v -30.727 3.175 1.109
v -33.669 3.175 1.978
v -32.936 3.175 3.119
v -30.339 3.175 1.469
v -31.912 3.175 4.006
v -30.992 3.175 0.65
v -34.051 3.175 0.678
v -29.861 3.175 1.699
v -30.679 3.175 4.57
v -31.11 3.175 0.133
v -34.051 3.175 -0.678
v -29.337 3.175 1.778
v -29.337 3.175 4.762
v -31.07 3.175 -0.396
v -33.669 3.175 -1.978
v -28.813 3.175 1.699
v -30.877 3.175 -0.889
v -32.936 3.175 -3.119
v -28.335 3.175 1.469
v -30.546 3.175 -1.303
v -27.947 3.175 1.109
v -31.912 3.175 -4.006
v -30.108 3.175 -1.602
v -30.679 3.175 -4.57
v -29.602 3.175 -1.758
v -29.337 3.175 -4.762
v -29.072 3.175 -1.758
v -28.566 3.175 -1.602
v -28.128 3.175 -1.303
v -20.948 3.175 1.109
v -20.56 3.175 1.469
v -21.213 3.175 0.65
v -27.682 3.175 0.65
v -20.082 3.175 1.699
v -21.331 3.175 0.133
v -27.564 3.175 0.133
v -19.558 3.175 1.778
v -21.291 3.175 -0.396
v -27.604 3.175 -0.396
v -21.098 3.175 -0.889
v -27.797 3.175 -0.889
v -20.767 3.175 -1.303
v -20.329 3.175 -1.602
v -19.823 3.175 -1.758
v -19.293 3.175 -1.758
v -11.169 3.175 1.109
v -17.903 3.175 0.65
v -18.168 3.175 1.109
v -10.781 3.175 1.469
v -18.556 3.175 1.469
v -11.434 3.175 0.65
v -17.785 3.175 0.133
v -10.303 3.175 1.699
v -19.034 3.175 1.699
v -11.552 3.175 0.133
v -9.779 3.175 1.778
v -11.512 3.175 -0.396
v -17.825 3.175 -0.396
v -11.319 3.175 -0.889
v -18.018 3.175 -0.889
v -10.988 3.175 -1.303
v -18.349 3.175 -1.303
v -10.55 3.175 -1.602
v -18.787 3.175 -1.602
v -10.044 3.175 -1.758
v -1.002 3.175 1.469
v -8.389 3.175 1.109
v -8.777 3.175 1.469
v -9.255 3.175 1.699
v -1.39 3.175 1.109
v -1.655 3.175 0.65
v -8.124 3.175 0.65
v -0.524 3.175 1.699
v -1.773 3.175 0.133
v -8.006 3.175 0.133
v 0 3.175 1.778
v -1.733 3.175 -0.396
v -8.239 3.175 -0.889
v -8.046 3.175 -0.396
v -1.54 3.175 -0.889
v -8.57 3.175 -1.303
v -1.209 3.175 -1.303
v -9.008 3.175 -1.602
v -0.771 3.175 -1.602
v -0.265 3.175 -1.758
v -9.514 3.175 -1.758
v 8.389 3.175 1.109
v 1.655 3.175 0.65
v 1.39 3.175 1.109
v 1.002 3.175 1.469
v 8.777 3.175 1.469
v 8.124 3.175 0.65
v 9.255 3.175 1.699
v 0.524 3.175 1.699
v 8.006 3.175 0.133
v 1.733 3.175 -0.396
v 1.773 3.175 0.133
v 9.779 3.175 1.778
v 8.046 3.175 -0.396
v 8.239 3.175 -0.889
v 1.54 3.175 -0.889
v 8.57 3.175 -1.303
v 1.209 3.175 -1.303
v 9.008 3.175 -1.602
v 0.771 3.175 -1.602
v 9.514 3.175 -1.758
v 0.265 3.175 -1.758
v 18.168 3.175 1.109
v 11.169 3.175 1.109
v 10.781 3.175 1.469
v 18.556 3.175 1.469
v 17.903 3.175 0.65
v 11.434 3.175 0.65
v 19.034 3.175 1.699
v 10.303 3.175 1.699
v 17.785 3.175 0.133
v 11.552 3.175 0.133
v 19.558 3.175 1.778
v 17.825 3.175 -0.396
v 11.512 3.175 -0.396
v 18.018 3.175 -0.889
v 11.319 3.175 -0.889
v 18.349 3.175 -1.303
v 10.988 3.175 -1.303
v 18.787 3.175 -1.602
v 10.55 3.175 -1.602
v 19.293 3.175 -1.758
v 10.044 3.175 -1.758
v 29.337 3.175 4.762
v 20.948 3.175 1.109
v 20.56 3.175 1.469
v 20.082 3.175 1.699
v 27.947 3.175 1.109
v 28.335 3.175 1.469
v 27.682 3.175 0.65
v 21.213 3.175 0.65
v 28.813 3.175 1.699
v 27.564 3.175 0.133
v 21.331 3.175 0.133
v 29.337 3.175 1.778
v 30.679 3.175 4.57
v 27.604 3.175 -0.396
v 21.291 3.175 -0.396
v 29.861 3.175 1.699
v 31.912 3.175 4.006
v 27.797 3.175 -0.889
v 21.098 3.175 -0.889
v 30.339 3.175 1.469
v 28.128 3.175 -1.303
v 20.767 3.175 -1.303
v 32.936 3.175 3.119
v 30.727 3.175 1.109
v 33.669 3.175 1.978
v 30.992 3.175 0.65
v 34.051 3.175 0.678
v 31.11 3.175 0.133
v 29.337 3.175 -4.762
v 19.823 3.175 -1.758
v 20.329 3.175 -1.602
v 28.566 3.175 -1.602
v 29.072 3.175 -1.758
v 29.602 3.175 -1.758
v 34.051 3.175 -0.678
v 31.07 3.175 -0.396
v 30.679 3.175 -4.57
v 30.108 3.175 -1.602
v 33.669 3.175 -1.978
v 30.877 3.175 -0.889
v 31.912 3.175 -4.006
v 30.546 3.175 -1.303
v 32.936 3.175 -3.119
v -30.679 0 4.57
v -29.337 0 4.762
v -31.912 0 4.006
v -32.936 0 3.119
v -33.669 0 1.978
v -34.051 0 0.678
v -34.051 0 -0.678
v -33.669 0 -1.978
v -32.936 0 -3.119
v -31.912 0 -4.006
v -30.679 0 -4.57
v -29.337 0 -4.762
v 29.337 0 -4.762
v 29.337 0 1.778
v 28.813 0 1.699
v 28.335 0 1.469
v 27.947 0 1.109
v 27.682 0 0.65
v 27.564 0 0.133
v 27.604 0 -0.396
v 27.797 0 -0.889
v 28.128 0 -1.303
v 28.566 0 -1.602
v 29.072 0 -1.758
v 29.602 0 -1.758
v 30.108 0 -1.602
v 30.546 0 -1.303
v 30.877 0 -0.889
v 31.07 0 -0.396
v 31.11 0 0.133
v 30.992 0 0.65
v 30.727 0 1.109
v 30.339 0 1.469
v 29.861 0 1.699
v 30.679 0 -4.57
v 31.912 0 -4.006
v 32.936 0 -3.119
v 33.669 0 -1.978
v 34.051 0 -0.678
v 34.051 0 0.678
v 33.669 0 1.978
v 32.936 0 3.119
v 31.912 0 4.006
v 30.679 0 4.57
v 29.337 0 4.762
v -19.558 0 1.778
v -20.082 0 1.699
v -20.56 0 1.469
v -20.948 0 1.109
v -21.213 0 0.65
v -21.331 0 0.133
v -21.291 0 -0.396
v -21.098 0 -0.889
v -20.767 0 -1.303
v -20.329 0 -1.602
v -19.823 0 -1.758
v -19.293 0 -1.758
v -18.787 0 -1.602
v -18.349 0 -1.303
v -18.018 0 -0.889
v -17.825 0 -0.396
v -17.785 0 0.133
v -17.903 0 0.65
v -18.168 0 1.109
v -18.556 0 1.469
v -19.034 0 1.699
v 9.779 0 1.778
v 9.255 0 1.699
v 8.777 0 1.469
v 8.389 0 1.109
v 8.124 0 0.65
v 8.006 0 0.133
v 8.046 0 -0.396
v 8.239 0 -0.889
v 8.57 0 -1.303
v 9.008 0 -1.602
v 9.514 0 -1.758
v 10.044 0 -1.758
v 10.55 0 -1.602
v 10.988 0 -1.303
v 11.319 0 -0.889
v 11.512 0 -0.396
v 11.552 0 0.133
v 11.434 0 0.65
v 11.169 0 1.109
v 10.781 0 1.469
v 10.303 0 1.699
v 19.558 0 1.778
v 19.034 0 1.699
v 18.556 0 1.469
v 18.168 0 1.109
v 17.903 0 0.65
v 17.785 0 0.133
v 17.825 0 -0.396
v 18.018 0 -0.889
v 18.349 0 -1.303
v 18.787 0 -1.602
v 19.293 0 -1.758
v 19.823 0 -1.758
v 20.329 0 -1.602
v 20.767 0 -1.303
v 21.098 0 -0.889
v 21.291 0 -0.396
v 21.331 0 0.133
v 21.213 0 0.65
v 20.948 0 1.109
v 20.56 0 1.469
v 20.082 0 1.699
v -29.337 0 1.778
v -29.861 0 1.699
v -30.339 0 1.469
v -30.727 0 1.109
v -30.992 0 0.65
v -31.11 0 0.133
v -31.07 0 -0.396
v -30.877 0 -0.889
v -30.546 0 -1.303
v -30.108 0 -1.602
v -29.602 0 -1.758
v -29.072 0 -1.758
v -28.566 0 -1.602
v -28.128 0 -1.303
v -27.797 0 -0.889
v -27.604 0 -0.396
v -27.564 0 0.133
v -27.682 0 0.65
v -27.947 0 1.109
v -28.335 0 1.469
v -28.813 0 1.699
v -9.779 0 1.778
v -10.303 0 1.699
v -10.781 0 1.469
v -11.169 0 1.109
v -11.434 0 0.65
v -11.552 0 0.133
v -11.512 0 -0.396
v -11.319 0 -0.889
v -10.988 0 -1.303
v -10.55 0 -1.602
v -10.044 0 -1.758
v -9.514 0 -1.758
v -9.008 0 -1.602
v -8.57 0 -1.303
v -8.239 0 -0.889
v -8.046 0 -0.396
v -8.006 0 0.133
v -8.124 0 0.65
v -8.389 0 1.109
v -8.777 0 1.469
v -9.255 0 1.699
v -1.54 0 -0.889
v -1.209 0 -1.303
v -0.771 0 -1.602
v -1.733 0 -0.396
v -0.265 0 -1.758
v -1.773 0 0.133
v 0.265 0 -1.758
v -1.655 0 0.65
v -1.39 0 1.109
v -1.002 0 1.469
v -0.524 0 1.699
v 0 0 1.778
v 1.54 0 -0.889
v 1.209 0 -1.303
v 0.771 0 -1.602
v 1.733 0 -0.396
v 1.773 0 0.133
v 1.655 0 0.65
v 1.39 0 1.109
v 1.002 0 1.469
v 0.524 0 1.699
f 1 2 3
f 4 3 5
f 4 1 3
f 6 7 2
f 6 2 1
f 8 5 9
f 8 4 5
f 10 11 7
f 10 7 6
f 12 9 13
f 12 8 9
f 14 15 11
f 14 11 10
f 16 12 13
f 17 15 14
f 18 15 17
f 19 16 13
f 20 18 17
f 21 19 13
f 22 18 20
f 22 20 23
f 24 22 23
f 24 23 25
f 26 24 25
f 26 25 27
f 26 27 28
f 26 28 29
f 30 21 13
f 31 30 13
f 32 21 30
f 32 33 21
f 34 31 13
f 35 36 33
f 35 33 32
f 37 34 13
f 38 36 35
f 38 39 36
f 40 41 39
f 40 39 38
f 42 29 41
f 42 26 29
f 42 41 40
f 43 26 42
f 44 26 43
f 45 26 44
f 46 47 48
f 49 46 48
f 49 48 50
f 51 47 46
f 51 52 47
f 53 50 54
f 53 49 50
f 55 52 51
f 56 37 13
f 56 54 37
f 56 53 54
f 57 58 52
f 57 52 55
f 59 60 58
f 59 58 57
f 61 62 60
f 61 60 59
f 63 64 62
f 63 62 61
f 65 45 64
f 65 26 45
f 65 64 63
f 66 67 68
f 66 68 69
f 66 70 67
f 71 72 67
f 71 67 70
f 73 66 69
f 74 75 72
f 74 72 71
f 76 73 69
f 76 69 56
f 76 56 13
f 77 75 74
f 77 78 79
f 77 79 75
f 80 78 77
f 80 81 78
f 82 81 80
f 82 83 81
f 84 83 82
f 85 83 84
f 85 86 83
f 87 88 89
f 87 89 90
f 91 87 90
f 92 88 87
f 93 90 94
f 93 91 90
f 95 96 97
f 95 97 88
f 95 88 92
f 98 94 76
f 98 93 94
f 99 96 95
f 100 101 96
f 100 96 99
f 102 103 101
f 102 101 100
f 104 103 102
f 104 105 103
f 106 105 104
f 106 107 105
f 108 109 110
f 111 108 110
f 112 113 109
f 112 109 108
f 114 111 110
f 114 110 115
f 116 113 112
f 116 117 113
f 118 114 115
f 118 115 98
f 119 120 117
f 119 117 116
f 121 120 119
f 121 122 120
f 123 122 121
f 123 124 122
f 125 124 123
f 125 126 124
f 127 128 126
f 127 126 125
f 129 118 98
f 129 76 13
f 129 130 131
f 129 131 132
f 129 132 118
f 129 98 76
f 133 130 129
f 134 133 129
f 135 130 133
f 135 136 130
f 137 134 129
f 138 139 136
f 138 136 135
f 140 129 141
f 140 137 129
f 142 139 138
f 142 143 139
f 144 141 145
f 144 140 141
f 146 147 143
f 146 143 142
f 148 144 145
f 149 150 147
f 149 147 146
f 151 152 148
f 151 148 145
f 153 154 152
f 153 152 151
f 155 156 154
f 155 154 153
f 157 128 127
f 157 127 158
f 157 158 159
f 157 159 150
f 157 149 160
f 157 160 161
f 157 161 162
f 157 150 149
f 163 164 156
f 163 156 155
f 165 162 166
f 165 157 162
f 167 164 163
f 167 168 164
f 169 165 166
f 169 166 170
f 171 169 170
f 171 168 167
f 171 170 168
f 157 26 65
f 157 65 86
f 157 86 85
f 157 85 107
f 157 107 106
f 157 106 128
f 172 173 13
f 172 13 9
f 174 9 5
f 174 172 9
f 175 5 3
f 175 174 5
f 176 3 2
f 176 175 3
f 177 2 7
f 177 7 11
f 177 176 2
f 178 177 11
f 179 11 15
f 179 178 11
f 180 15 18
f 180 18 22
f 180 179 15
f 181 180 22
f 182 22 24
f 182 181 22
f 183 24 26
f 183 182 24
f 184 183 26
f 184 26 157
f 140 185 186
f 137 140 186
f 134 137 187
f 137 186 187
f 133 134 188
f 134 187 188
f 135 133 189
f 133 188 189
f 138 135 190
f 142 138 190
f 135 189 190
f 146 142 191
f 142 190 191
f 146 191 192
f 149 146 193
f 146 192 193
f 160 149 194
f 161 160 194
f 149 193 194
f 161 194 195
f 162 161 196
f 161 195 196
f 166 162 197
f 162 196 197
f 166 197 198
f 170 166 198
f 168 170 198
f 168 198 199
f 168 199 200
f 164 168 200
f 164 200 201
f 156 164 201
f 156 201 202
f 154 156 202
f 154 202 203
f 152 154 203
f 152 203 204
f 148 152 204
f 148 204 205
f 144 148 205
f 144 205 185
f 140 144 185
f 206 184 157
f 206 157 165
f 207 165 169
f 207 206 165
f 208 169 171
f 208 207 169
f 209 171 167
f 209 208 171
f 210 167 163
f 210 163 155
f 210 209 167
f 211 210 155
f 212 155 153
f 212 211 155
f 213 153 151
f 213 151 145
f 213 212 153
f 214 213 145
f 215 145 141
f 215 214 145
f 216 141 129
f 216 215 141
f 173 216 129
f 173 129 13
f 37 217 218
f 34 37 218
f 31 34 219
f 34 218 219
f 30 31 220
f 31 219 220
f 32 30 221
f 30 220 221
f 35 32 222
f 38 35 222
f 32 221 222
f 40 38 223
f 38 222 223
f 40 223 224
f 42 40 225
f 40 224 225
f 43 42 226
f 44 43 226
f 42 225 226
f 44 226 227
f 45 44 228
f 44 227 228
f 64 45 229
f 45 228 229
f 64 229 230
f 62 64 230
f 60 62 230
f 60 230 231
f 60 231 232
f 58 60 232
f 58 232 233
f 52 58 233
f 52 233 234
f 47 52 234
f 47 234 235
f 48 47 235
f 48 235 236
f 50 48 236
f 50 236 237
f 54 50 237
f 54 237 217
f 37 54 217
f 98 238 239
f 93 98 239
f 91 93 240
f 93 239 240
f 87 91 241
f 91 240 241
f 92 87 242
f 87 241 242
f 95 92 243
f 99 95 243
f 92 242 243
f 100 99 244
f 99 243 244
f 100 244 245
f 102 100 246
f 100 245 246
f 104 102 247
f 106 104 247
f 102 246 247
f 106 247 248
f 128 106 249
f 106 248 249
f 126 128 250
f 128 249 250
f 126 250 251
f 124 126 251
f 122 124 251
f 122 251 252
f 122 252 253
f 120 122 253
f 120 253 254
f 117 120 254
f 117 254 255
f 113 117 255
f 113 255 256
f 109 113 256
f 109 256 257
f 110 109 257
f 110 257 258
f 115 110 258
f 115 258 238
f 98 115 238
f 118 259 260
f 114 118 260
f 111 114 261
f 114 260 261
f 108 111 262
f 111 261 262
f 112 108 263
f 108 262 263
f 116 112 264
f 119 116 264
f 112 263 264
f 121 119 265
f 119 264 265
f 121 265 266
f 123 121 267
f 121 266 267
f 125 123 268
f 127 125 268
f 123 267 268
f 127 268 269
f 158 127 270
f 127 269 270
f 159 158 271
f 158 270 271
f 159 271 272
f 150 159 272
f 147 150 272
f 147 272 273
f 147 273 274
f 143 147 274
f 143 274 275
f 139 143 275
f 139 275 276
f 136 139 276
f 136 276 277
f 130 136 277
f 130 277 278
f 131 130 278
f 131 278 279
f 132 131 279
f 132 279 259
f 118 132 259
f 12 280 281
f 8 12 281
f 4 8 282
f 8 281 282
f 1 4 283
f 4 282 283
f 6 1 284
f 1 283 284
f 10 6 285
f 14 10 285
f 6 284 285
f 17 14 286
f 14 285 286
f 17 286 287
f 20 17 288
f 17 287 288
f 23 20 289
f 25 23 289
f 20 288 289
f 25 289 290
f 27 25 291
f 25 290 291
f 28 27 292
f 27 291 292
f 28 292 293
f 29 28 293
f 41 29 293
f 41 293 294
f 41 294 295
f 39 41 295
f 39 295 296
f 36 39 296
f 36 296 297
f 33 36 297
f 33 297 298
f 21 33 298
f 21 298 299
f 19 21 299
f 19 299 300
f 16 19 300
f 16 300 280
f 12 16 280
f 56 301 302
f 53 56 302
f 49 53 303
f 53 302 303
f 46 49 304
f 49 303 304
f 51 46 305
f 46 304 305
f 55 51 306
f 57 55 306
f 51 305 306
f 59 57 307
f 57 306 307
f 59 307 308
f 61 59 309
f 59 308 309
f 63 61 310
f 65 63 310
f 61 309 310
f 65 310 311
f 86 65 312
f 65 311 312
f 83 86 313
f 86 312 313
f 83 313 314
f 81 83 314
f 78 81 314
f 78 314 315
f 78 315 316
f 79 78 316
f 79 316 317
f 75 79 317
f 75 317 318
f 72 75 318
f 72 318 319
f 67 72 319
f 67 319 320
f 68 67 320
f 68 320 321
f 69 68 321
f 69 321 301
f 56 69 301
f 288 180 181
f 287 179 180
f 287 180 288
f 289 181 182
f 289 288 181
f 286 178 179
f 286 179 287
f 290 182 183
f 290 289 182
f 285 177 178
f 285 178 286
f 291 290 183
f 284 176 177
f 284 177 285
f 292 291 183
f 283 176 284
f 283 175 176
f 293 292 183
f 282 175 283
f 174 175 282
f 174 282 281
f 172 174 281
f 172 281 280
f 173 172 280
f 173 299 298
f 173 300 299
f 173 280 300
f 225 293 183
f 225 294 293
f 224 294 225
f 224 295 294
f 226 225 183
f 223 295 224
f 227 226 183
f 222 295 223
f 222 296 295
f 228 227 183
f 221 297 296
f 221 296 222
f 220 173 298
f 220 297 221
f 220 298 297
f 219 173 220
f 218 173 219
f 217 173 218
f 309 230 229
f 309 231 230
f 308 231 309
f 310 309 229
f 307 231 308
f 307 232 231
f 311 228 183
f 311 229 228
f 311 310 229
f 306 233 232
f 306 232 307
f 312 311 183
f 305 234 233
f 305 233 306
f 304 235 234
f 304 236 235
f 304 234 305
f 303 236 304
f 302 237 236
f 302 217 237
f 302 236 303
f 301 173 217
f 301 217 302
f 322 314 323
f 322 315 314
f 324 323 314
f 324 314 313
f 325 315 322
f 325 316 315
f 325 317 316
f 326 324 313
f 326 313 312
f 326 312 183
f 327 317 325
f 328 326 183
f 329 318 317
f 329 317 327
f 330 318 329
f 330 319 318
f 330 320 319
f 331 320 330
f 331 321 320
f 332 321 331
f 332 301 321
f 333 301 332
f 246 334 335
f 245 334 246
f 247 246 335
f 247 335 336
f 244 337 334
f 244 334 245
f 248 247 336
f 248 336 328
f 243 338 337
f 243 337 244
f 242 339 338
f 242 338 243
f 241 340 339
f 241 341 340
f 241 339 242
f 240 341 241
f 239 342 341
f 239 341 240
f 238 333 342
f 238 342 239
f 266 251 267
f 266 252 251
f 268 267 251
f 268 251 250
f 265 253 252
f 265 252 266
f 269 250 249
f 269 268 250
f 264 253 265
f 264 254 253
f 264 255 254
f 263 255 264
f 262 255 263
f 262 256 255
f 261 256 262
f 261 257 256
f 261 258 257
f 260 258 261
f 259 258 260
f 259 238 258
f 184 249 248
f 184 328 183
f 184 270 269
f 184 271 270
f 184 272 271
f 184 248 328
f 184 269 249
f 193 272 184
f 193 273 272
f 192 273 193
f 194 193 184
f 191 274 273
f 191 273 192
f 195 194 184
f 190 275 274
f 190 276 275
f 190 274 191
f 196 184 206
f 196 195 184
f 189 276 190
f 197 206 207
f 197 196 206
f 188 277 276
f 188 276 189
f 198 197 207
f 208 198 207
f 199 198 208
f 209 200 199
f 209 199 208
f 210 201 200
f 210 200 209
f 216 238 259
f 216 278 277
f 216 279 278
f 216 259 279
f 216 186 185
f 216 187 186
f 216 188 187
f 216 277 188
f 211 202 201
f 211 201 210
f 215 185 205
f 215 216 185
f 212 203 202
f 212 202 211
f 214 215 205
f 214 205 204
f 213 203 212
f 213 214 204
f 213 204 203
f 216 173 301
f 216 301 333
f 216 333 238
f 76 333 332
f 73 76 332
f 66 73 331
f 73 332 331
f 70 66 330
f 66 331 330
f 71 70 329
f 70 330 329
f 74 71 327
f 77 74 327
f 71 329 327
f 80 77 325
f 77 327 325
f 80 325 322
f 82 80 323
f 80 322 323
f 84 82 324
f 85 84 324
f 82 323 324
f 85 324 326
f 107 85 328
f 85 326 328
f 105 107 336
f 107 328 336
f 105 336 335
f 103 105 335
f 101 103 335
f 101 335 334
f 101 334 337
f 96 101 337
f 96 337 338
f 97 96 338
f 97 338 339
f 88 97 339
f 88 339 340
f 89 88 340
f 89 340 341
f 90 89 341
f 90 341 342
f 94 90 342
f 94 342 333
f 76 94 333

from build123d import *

# Parameters (mm, degrees)
SKETCH1_R           = 1.778
BOSS_EXTRUDE1_DEPTH = 6.35
SKETCH2_W           = 91.819515258
SKETCH2_H           = 20.708231101
CUT_EXTRUDE1_DEPTH  = 3.175


with BuildPart() as part:
    # Sketch1 → Boss-Extrude1 (new body)
    with BuildSketch(Plane.XZ):
        with BuildLine():
            Line((-29.337, -4.7625), (29.337, -4.7625))
            ThreePointArc((29.337, -4.7625), (34.0995, 0), (29.337, 4.7625))
            Line((29.337, 4.7625), (-29.337, 4.7625))
            ThreePointArc((-29.337, 4.7625), (-34.0995, 0), (-29.337, -4.7625))
        make_face()
        with Locations(Location((29.337, 0, 0), (0, 0, 90))):
            Circle(SKETCH1_R, mode=Mode.SUBTRACT)
        with Locations(Location((19.558, 0, 0), (0, 0, 90))):
            Circle(SKETCH1_R, mode=Mode.SUBTRACT)
        with Locations(Location((9.779, 0, 0), (0, 0, 90))):
            Circle(SKETCH1_R, mode=Mode.SUBTRACT)
        with Locations(Location((0, 0, 0), (0, 0, 90))):
            Circle(SKETCH1_R, mode=Mode.SUBTRACT)
        with Locations(Location((-9.779, 0, 0), (0, 0, 90))):
            Circle(SKETCH1_R, mode=Mode.SUBTRACT)
        with Locations(Location((-19.558, 0, 0), (0, 0, 90))):
            Circle(SKETCH1_R, mode=Mode.SUBTRACT)
        with Locations(Location((-29.337, 0, 0), (0, 0, 90))):
            Circle(SKETCH1_R, mode=Mode.SUBTRACT)
    extrude(amount=-BOSS_EXTRUDE1_DEPTH)

    # Sketch2 → Cut-Extrude1 (cut)
    with BuildSketch(Plane(origin=(0, 6.35, 0), x_dir=(1, 0, 0), z_dir=(0, 1, 0))):
        with Locations((-4.688656098, 0.586082012)):
            Rectangle(SKETCH2_W, SKETCH2_H)
    extrude(amount=-CUT_EXTRUDE1_DEPTH, mode=Mode.SUBTRACT)


solid = part.part
